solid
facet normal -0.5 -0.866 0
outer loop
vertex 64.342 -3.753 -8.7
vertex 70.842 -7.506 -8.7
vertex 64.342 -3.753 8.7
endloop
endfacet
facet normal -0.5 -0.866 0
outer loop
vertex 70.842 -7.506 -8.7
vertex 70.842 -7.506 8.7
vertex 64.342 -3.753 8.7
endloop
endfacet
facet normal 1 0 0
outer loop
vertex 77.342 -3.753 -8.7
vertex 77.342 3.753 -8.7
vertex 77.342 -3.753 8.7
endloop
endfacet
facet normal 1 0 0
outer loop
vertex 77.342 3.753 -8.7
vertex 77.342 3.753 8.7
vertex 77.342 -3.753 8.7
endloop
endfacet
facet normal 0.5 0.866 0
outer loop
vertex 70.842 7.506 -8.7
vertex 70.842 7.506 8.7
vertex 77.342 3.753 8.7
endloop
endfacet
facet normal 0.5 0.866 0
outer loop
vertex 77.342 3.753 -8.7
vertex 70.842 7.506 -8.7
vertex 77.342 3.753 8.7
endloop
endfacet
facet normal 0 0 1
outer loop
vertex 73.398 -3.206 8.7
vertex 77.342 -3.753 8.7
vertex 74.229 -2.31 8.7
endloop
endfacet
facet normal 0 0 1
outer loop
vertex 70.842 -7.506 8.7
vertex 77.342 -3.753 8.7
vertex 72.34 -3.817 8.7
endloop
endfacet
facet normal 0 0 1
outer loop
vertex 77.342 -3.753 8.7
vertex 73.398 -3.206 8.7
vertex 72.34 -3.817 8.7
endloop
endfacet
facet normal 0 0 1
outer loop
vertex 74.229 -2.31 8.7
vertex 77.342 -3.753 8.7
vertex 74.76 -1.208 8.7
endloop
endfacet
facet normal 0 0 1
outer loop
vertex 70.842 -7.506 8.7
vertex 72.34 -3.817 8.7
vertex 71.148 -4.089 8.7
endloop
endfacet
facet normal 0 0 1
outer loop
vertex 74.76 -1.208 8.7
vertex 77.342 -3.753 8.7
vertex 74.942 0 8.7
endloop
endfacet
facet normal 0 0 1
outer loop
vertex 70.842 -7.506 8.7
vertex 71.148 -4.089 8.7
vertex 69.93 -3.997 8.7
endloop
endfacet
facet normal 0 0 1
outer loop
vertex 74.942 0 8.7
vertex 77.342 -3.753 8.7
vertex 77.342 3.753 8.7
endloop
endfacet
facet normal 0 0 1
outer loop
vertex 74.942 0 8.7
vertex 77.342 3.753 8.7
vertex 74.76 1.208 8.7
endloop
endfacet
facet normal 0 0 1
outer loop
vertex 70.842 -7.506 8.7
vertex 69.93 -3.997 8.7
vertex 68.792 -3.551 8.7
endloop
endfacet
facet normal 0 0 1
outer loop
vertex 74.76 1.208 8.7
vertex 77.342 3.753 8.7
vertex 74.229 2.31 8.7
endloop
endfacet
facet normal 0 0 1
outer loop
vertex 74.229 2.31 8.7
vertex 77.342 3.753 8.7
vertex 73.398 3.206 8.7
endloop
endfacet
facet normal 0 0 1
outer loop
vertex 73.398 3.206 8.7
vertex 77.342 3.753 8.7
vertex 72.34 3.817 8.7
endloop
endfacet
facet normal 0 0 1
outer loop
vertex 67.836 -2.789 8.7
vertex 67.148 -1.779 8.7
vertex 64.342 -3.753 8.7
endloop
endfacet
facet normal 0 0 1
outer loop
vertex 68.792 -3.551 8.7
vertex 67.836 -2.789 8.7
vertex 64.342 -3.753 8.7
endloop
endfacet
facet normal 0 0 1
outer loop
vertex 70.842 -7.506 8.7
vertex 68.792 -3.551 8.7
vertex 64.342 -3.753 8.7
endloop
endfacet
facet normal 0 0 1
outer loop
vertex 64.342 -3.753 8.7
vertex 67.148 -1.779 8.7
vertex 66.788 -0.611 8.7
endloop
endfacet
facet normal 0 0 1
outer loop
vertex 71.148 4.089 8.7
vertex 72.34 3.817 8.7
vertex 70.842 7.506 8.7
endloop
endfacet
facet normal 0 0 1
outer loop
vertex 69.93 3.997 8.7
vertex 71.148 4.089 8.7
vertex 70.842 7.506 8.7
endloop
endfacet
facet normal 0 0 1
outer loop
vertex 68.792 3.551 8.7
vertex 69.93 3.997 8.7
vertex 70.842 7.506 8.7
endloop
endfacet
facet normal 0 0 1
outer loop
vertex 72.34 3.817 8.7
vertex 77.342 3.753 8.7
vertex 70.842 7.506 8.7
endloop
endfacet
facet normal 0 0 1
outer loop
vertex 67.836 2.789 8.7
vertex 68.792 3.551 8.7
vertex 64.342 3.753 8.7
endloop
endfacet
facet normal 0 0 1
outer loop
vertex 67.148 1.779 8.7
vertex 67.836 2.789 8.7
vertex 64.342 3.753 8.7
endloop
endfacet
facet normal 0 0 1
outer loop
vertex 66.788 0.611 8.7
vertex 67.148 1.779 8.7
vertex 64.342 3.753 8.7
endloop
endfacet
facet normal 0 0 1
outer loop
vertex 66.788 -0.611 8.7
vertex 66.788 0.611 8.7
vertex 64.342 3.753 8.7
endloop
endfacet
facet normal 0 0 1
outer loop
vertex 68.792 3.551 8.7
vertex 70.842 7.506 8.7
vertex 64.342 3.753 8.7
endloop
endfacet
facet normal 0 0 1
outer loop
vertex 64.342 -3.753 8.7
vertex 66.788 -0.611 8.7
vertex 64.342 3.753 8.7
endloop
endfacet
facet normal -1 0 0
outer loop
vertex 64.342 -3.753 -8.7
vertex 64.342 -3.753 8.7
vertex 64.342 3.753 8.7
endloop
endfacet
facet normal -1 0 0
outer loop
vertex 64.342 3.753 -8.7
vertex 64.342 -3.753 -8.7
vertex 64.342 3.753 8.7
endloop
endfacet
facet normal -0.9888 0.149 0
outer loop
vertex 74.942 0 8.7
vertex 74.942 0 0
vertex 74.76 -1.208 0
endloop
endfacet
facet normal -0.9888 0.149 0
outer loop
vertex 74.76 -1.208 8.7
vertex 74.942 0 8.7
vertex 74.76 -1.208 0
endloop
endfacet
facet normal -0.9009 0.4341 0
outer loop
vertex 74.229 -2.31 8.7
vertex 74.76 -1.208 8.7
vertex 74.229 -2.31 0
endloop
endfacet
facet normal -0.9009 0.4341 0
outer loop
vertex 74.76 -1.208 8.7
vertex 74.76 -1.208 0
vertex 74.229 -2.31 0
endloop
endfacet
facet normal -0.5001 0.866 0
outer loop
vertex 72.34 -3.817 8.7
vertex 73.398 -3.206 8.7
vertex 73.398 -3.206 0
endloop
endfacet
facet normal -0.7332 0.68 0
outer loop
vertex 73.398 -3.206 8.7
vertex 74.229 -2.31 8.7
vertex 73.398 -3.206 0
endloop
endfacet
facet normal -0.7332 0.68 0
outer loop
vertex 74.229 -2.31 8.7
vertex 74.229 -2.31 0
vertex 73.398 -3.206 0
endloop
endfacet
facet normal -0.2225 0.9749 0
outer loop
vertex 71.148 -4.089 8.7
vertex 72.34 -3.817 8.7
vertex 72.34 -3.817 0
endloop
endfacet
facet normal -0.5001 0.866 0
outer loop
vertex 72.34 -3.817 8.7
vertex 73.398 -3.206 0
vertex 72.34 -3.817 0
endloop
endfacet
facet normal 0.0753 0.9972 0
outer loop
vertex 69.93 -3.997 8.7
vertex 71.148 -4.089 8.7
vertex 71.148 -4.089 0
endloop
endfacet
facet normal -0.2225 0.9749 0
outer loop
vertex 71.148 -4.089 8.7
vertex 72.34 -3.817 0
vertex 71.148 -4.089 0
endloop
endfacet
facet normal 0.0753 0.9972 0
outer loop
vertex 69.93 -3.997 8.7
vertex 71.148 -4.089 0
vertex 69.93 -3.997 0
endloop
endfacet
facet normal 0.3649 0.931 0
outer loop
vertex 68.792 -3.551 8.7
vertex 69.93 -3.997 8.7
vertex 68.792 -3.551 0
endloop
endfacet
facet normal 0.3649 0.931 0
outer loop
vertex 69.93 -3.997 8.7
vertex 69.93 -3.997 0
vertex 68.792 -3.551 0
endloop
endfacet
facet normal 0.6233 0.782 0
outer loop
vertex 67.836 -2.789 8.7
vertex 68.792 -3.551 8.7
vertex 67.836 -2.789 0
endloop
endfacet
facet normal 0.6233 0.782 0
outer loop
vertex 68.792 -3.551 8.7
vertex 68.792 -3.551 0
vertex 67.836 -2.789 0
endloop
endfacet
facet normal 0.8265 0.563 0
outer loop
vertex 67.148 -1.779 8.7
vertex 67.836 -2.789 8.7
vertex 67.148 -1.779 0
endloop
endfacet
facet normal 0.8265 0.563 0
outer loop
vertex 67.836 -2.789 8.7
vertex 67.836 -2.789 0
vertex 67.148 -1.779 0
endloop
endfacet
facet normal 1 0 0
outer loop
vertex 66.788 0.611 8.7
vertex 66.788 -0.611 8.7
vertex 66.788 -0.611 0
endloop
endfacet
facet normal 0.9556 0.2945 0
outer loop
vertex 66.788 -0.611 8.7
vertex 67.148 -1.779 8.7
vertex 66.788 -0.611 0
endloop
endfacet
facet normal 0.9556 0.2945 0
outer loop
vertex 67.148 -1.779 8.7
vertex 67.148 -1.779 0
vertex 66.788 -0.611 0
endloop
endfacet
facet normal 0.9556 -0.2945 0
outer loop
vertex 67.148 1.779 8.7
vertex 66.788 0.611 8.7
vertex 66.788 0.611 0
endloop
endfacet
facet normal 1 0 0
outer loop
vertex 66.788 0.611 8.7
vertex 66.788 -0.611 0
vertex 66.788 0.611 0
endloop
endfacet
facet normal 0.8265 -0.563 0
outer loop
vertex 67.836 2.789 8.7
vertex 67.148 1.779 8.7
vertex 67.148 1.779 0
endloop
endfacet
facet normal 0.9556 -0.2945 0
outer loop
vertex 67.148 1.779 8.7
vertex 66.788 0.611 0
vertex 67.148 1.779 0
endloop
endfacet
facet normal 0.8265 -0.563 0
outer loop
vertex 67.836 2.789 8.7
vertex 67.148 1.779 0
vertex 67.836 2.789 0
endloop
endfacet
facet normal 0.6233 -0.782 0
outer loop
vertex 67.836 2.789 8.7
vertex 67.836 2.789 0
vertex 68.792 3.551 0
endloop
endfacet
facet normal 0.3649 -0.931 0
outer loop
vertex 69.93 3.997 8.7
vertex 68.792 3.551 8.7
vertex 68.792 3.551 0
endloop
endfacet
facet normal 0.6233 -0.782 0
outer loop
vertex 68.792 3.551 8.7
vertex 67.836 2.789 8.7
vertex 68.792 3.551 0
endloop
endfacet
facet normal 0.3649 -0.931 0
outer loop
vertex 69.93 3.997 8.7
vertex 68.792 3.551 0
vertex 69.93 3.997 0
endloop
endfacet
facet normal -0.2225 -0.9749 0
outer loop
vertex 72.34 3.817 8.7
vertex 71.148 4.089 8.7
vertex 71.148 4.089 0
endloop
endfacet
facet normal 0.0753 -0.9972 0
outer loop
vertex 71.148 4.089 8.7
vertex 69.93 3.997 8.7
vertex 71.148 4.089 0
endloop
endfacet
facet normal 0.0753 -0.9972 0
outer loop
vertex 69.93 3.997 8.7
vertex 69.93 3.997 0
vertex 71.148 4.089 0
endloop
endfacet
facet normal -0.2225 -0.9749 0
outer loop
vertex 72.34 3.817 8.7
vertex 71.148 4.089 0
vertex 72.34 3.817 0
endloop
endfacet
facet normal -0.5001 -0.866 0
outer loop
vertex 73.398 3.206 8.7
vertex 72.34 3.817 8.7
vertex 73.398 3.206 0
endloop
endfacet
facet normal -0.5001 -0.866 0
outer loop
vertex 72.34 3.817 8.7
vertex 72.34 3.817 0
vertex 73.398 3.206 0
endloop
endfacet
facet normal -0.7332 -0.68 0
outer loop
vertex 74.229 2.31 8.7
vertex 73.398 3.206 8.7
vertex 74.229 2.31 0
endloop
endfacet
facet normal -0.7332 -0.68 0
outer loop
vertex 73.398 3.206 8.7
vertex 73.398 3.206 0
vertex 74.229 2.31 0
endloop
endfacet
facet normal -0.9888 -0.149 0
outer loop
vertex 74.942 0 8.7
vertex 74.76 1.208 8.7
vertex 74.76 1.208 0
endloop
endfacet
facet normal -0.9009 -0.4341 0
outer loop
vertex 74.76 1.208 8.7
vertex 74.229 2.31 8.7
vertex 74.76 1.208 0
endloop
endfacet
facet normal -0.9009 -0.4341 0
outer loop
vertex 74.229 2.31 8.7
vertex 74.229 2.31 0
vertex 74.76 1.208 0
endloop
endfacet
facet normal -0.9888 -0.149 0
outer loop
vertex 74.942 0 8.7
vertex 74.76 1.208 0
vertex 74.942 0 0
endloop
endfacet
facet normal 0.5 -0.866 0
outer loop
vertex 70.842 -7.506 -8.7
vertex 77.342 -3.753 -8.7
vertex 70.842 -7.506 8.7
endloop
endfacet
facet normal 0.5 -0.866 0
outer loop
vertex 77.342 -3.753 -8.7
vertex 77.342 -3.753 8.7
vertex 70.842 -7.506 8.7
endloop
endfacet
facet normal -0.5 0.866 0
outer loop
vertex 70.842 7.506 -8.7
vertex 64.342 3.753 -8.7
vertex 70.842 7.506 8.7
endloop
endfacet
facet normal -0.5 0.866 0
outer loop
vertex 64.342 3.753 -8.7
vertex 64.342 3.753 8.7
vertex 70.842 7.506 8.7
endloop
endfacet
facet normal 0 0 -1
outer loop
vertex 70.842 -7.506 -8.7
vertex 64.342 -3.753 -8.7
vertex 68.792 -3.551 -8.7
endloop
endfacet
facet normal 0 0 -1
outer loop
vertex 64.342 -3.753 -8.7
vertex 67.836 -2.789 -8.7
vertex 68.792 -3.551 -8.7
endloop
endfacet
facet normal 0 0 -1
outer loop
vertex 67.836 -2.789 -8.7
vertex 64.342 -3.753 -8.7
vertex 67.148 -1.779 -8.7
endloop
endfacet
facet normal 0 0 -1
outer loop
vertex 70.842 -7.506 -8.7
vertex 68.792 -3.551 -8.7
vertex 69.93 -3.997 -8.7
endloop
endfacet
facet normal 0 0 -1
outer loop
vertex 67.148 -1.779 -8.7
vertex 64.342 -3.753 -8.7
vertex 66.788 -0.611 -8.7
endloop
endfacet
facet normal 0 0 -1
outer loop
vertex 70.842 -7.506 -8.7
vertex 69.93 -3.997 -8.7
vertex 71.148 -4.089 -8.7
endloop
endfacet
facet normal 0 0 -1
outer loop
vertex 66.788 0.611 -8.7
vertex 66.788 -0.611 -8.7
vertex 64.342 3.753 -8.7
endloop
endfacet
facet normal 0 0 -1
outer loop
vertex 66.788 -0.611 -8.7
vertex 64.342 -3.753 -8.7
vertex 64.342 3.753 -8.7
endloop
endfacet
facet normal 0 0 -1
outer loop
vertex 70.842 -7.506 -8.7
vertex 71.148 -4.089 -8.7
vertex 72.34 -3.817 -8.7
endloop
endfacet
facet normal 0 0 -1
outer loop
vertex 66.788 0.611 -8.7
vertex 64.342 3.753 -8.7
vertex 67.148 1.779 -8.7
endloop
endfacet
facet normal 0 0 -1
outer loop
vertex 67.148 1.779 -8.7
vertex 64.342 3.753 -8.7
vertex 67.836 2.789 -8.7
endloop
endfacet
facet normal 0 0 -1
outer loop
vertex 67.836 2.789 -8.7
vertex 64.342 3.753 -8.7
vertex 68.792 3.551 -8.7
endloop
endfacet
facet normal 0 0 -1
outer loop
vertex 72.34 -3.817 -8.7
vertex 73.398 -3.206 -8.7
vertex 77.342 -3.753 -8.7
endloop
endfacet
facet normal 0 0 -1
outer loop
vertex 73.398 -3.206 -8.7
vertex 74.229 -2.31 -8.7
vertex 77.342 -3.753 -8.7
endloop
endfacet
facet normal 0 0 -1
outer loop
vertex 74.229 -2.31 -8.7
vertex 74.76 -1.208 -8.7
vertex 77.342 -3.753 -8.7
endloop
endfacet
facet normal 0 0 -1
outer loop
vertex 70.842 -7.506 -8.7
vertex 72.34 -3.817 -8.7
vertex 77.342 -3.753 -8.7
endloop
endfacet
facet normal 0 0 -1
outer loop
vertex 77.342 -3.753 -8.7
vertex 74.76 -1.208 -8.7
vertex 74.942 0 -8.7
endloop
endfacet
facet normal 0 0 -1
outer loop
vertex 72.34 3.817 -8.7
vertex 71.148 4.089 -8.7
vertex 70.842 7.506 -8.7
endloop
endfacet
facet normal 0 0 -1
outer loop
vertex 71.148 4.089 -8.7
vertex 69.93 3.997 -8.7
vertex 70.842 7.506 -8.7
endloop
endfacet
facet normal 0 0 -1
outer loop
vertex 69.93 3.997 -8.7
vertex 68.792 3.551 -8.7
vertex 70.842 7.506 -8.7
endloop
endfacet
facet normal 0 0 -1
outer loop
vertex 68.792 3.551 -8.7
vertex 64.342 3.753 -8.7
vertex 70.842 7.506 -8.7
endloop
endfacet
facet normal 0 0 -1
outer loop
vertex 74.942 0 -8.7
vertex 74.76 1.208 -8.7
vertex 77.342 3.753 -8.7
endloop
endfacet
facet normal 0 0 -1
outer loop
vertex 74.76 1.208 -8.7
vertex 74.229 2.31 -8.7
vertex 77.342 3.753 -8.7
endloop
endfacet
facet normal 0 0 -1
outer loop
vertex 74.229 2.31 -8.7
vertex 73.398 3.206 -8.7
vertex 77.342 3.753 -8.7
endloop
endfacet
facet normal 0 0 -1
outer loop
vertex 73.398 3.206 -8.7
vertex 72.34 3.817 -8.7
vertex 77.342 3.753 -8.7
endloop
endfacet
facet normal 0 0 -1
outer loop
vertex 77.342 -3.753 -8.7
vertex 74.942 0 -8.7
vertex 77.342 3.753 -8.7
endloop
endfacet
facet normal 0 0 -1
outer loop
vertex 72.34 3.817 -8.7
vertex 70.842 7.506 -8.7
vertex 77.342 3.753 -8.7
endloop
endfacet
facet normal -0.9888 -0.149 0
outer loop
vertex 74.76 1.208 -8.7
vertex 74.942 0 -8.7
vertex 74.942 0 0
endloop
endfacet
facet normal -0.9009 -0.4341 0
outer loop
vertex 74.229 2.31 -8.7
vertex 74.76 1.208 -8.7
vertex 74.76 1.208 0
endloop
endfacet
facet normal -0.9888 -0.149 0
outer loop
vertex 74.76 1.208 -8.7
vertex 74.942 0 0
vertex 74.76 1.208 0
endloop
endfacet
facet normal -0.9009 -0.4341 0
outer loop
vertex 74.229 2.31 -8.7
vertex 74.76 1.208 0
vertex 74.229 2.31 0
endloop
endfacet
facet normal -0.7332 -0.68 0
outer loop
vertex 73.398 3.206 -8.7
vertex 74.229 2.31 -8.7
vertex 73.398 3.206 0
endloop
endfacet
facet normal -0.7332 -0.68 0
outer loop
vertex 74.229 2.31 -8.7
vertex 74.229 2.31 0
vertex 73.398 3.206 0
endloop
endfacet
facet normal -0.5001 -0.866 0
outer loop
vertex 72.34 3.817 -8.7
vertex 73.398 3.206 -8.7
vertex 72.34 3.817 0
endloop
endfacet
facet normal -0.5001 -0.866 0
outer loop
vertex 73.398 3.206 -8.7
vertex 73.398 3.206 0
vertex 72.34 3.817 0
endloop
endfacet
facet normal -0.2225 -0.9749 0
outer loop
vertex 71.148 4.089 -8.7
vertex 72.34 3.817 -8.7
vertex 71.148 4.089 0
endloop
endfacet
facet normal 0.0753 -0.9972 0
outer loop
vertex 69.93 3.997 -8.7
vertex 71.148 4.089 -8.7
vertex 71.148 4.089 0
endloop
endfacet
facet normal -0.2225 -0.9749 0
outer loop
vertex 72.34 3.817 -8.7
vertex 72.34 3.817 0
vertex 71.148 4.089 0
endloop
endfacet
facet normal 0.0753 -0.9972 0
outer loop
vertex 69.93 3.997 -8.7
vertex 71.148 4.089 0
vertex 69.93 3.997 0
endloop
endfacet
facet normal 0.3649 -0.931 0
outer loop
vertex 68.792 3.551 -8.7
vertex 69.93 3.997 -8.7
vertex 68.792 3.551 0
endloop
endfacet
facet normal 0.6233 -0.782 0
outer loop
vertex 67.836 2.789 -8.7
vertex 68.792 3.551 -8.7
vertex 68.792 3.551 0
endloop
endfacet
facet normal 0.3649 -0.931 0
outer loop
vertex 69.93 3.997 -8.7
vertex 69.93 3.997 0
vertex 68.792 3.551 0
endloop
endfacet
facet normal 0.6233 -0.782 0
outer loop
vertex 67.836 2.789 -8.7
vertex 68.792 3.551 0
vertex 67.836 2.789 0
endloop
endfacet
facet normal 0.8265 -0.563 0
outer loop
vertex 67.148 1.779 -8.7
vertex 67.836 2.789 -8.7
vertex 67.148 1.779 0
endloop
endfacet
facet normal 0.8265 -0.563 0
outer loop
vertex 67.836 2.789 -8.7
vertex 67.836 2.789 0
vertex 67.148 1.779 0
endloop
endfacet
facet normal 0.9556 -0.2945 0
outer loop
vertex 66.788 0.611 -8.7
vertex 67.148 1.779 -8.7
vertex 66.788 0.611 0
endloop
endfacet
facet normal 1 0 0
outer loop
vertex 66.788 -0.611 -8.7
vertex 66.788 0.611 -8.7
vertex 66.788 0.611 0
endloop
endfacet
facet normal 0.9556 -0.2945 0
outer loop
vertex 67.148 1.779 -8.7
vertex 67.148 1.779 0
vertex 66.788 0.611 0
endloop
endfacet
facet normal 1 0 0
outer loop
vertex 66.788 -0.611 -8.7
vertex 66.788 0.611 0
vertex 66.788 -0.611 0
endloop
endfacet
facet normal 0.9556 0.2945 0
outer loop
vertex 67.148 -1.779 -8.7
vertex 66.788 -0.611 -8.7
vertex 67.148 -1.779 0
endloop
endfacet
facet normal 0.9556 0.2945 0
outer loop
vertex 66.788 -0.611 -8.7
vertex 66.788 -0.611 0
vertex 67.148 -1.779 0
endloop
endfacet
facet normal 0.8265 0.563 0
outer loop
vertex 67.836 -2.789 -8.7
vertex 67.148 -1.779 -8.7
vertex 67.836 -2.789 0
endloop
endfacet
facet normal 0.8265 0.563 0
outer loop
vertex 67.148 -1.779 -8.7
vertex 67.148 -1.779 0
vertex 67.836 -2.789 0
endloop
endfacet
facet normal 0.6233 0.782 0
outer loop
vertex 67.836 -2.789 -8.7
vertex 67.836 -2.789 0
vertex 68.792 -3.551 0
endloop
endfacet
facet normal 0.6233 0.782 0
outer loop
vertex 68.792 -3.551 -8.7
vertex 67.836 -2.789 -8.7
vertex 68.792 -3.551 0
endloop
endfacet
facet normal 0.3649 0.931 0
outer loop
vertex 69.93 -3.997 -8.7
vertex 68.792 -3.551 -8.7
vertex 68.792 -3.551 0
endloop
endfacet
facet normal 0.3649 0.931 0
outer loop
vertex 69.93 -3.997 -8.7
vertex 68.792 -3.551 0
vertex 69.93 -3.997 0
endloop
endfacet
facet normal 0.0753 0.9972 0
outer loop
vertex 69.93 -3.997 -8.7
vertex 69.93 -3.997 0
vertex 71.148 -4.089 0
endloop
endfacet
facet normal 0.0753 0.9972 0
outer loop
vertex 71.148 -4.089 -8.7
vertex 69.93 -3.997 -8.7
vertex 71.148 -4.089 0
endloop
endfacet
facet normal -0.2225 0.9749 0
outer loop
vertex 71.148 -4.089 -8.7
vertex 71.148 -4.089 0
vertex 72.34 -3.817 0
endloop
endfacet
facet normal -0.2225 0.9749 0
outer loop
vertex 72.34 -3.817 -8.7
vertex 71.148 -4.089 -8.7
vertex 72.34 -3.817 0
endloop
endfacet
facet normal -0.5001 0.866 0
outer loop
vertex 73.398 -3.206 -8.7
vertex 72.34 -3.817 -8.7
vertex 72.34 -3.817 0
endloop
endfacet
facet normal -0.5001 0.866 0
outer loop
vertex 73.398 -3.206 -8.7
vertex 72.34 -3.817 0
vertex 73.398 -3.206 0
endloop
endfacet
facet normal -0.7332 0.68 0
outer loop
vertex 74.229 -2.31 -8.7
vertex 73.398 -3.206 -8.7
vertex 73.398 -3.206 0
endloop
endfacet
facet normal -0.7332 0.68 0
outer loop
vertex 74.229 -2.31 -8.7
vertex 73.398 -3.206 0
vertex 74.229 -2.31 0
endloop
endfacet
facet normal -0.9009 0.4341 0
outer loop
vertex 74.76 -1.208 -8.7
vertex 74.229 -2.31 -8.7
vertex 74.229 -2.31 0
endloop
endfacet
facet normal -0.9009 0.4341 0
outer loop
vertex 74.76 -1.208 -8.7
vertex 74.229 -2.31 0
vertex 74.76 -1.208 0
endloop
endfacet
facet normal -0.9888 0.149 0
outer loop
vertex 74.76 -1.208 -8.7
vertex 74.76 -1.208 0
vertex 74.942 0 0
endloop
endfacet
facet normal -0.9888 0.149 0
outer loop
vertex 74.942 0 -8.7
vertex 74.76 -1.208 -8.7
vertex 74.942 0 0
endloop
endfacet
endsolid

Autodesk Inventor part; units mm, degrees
ref_plane "YZ Plane" through (0, 0, 0) normal (1, 0, 0) x (0, 1, 0)
ref_plane "XZ Plane" through (0, 0, 0) normal (0, 1, 0) x (-1, 0, 0)
ref_plane "XY Plane" through (0, 0, 0) normal (0, 0, 1) x (1, 0, 0)
sketch "Skizze1" plane through (0, 0, 0) normal (0, 0, 1) x (1, 0, 0)
  line L0 (70.8419, 7.621) -> (77.4419, 3.8105) construction
  line L1 (64.2419, 3.8105) -> (70.8419, 7.621) construction
  line L2 (70.8419, 7.5056) -> (77.3419, 3.7528)
  line L3 (77.3419, 3.7528) -> (77.3419, -3.7528)
  line L4 (77.3419, -3.7528) -> (70.8419, -7.5056)
  line L5 (70.8419, -7.5056) -> (64.3419, -3.7528)
  line L6 (64.3419, -3.7528) -> (64.3419, 3.7528)
  line L7 (64.3419, 3.7528) -> (70.8419, 7.5056)
  circle A0 centre (70.8419, 0) radius 4.1
  point P0 (0, 0)
  dimension "d0" = 13
  dimension "d1" = 8.2
extrude "Extrusion1" add sketch "Skizze1" against normal blind 8.7
mirror "Spiegeln1" about plane through (70.8419, 0, 0) normal (0, 0, 1) of "Extrusion1"
properties part number "Nutplacer" material "ABS-Kunststoff - Schwarz"
